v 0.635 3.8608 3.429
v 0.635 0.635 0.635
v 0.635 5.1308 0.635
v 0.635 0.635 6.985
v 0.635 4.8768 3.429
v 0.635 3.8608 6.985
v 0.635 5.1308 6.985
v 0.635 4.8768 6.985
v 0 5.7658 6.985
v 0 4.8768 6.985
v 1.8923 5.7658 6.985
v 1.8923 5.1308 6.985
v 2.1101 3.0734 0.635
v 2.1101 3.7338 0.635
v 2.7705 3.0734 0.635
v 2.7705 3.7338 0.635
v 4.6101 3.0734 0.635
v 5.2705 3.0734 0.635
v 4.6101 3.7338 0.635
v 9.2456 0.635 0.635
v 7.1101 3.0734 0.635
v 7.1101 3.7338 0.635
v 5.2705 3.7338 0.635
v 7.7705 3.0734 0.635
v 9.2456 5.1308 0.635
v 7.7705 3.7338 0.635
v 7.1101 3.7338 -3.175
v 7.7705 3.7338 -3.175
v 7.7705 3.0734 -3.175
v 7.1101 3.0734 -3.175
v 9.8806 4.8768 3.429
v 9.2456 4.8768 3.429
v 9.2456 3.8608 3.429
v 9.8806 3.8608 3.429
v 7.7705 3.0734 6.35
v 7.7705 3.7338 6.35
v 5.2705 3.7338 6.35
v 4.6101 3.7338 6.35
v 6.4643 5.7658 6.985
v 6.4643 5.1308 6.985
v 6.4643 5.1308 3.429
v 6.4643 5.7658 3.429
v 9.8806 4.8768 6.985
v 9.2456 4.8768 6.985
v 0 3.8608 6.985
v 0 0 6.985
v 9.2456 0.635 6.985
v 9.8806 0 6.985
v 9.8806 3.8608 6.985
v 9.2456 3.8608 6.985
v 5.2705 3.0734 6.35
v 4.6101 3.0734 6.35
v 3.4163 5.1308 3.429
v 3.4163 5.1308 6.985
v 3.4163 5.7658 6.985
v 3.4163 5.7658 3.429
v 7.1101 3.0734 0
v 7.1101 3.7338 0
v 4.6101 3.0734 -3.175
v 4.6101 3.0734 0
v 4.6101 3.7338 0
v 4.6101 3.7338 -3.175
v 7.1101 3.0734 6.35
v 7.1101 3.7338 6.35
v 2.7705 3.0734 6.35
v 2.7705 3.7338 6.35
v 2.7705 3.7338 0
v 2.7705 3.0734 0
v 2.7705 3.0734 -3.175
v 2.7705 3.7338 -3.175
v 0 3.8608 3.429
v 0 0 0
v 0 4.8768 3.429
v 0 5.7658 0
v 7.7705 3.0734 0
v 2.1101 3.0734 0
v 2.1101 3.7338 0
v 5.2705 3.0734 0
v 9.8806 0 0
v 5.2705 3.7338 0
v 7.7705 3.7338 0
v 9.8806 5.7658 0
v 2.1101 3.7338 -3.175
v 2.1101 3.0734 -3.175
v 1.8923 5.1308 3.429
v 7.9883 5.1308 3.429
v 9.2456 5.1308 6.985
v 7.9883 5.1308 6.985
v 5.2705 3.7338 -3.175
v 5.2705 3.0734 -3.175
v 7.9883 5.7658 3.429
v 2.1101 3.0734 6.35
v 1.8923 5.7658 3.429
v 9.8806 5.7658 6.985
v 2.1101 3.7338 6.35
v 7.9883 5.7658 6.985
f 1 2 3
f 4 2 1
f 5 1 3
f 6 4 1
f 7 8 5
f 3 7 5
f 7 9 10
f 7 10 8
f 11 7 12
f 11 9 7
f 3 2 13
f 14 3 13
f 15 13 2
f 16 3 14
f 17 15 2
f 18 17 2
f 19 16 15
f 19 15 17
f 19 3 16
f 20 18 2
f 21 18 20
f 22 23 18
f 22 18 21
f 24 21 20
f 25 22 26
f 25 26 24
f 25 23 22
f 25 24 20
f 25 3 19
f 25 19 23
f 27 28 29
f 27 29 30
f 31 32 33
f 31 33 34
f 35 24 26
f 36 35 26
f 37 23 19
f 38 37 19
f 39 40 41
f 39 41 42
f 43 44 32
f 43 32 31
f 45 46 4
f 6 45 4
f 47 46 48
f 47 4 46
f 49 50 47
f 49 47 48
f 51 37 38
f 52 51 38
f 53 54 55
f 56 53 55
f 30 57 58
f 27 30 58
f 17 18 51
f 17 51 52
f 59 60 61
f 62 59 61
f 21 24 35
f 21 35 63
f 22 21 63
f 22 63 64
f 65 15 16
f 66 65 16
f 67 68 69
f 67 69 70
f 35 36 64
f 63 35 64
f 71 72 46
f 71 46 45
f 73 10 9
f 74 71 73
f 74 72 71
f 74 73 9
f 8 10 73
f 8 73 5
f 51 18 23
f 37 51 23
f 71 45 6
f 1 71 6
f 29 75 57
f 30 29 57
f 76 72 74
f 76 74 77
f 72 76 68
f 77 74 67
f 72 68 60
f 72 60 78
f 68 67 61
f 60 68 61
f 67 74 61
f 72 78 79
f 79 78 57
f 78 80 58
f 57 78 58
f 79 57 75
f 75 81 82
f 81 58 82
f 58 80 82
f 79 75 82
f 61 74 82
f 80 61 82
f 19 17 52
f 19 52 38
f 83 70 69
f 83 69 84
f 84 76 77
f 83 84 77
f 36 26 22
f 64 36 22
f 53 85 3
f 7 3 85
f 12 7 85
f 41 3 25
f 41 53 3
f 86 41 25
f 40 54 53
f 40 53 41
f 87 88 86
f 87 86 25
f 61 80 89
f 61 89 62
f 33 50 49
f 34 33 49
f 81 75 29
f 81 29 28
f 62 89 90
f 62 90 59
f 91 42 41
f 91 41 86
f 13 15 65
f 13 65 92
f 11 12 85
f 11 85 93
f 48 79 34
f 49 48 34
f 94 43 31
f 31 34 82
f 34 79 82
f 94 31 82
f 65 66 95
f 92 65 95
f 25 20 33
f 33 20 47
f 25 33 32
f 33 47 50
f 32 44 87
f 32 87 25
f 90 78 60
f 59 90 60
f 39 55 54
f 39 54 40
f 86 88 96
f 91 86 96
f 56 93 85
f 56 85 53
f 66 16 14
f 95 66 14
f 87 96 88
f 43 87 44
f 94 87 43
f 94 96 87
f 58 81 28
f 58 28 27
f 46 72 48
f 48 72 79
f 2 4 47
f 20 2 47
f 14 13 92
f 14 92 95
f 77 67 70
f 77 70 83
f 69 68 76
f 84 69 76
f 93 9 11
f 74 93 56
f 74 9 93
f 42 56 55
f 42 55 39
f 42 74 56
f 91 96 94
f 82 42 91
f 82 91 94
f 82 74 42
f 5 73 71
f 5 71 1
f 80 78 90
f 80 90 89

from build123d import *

# Parameters (mm, degrees)
SKETCH1_W           = 9.8806
SKETCH1_H           = 5.7658
BOSS_EXTRUDE1_DEPTH = 6.985
SKETCH2_W           = 0.6604
SKETCH2_H           = 0.6604
BOSS_EXTRUDE2_DEPTH = 3.175
SKETCH4_W           = 8.6106
SKETCH4_H           = 4.4958
CUT_EXTRUDE1_DEPTH  = 6.35
SKETCH2_2_W         = 0.6604
SKETCH2_2_H         = 0.6604
BOSS_EXTRUDE3_DEPTH = 6.35
SKETCH5_W           = 0.635
SKETCH5_H           = 1.016
SKETCH5_W_2         = 1.524
SKETCH5_H_2         = 0.635
CUT_EXTRUDE2_DEPTH  = 3.556


with BuildPart() as part:
    # Sketch1 → Boss-Extrude1 (new body)
    with BuildSketch(Plane.XY):
        with Locations((4.9403, 2.8829)):
            Rectangle(SKETCH1_W, SKETCH1_H)
    extrude(amount=BOSS_EXTRUDE1_DEPTH)

    # Sketch2 → Boss-Extrude2 (add)
    with BuildSketch(Plane(origin=(0, 0, 0), x_dir=(-1, 0, 0), z_dir=(0, 0, -1))):
        with Locations((-7.4403, 3.4036)):
            Rectangle(SKETCH2_W, SKETCH2_H)
        with Locations((-4.9403, 3.4036)):
            Rectangle(SKETCH2_W, SKETCH2_H)
        with Locations((-2.4403, 3.4036)):
            Rectangle(SKETCH2_W, SKETCH2_H)
    extrude(amount=BOSS_EXTRUDE2_DEPTH)

    # Sketch4 → Cut-Extrude1 (cut)
    with BuildSketch(Plane.XY.offset(6.985)):
        with Locations((4.9403, 2.8829)):
            Rectangle(SKETCH4_W, SKETCH4_H)
    extrude(amount=-CUT_EXTRUDE1_DEPTH, mode=Mode.SUBTRACT)

    # Sketch2<2> → Boss-Extrude3 (add)
    with BuildSketch(Plane(origin=(0, 0, 0), x_dir=(-1, 0, 0), z_dir=(0, 0, -1))):
        with Locations((-7.4403, 3.4036)):
            Rectangle(SKETCH2_2_W, SKETCH2_2_H)
        with Locations((-4.9403, 3.4036)):
            Rectangle(SKETCH2_2_W, SKETCH2_2_H)
        with Locations((-2.4403, 3.4036)):
            Rectangle(SKETCH2_2_W, SKETCH2_2_H)
    extrude(amount=-BOSS_EXTRUDE3_DEPTH)

    # Sketch5 → Cut-Extrude2 (cut)
    with BuildSketch(Plane.XY.offset(6.985)):
        with Locations((0.3175, 4.3688)):
            Rectangle(SKETCH5_W, SKETCH5_H)
        with Locations((9.5631, 4.3688)):
            Rectangle(SKETCH5_W, SKETCH5_H)
        with Locations((7.2263, 5.4483)):
            Rectangle(SKETCH5_W_2, SKETCH5_H_2)
        with Locations((2.6543, 5.4483)):
            Rectangle(SKETCH5_W_2, SKETCH5_H_2)
    extrude(amount=-CUT_EXTRUDE2_DEPTH, mode=Mode.SUBTRACT)


solid = part.part
